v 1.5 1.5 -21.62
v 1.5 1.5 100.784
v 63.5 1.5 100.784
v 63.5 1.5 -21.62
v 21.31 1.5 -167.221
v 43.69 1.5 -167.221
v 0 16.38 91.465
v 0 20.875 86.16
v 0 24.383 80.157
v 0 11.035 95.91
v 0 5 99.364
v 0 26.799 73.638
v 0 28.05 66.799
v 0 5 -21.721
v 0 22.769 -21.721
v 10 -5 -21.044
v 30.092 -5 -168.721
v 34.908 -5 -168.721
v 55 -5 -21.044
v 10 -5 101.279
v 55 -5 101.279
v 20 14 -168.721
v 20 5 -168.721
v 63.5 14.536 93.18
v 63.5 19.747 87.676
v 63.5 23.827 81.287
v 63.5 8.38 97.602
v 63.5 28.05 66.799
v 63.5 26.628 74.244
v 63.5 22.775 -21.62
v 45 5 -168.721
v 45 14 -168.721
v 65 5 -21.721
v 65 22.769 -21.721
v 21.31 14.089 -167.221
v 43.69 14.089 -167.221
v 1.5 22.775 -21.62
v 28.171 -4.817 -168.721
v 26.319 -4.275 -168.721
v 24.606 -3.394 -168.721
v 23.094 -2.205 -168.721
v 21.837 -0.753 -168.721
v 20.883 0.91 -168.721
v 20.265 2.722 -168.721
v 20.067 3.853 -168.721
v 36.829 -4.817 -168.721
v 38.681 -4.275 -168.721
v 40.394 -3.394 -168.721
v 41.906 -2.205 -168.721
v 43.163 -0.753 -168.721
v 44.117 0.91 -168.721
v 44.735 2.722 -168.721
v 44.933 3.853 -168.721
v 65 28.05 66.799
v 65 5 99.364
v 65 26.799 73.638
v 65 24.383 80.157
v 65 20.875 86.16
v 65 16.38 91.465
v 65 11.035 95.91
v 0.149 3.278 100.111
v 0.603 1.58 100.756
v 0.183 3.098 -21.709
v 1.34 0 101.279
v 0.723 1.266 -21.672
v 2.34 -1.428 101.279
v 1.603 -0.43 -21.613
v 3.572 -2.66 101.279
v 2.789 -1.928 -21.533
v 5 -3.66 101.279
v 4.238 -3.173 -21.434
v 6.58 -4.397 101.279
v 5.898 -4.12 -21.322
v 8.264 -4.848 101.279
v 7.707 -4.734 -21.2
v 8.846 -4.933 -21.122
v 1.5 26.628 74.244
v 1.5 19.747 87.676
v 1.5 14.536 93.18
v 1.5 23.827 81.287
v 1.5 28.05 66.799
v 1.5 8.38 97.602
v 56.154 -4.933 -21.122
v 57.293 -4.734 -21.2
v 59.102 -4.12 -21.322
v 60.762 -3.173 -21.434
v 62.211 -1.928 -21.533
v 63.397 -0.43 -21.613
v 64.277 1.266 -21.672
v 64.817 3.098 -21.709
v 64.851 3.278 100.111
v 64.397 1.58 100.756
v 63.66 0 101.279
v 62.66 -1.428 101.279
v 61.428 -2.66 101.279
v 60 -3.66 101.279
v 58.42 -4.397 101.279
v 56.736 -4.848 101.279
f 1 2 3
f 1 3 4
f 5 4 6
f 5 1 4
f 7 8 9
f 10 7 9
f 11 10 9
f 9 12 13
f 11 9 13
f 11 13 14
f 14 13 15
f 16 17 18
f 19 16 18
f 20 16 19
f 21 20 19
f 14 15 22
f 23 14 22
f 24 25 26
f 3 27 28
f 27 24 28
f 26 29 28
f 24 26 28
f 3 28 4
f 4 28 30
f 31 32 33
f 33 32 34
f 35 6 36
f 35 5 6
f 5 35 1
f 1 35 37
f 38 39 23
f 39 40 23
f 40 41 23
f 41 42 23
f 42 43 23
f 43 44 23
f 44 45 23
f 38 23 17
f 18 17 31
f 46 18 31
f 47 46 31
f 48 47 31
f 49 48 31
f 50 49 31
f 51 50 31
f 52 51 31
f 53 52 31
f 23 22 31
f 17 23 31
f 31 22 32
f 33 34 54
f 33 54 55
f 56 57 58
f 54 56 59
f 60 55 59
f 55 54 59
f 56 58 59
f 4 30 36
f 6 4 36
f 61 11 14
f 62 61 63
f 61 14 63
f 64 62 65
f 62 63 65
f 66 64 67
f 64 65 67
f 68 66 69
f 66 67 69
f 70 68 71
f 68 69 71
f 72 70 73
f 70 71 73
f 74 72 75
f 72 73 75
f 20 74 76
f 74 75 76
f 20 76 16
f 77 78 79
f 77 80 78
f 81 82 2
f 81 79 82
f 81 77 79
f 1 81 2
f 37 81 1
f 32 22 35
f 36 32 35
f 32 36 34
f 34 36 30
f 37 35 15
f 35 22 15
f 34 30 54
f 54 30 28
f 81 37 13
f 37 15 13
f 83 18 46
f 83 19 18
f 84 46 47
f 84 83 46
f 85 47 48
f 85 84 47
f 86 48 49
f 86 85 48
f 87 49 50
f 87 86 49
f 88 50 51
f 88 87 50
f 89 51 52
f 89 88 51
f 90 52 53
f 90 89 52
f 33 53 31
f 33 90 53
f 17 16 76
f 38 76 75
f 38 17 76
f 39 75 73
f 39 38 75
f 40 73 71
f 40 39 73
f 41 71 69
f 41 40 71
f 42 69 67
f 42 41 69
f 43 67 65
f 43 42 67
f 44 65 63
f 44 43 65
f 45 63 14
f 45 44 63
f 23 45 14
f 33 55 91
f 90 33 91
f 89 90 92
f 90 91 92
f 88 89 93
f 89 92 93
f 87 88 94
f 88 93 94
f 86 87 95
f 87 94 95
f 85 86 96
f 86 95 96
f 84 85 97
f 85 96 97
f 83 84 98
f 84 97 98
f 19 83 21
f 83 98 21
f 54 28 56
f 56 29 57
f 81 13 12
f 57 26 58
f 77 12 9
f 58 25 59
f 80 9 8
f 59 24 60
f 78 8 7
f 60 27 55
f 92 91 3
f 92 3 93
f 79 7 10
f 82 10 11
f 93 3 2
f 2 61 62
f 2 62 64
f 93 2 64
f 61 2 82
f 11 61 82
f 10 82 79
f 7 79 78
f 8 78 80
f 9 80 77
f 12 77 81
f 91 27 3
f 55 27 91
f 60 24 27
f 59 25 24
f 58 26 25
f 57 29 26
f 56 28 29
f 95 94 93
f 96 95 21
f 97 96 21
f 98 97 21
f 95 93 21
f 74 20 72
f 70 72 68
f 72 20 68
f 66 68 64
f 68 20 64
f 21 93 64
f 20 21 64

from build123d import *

# Parameters (mm, degrees)
BOSS_EXTRUDE1_DEPTH     = 65
CUT_EXTRUDE1_DEPTH      = 183.971935996
CUT_EXTRUDE1_DEPTH_BACK = 183.971935996
CUT_EXTRUDE2_DEPTH      = 183.971935996
CUT_EXTRUDE2_DEPTH_BACK = 183.971935996
SHELL2_T                = -1.5
BOSS_EXTRUDE4_DEPTH     = 5
FILLET12_R              = 10


with BuildPart() as part:
    # Sketch1 → Boss-Extrude1 (new body)
    with BuildSketch(Plane(origin=(0, 0, 0), x_dir=(0, 0, -1), z_dir=(1, 0, 0))):
        with BuildLine():
            Line((-101.278568247, 0), (168.721431753, 0))
            Line((168.721431753, 0), (168.721431753, 14))
            Line((168.721431753, 14), (-66.798599974, 28.050095))
            ThreePointArc((-66.798599974, 28.050095), (-88.293376402, 19.255158243), (-101.278568247, 0))
        make_face()
    extrude(amount=BOSS_EXTRUDE1_DEPTH)

    # Sketch3 → Cut-Extrude1 (cut, two sides: drawn at the far end of the back side and taken through both)
    with BuildSketch(Plane.XZ.offset(-CUT_EXTRUDE1_DEPTH_BACK)):
        Polygon((-75.150987408, 530.638325694), (0, -21.721431753), (20, -168.721431753), (95.150987408, -721.081189199), (-1009.568527485, -871.383164014), (-1179.8705023, 380.336350878), align=None)
    extrude(amount=CUT_EXTRUDE1_DEPTH + CUT_EXTRUDE1_DEPTH_BACK, mode=Mode.SUBTRACT)

    # Sketch5 → Cut-Extrude2 (cut, two sides: drawn at the far end of the back side and taken through both)
    with BuildSketch(Plane.XZ.offset(-CUT_EXTRUDE2_DEPTH_BACK)):
        Polygon((140.150987408, 530.638325694), (65, -21.721431753), (45, -168.721431753), (-30.150987408, -721.081189199), (1074.568527485, -871.383164014), (1244.8705023, 380.336350878), align=None)
    extrude(amount=CUT_EXTRUDE2_DEPTH + CUT_EXTRUDE2_DEPTH_BACK, mode=Mode.SUBTRACT)

    # Shell2
    shell2_openings = [part.faces().sort_by_distance(p)[0] for p in [
        (32.5, 22.000053007, -34.617517295),
        (32.5, 19.255158243, 88.293376402),
    ]]
    offset(amount=SHELL2_T, openings=shell2_openings, kind=Kind.INTERSECTION)

    # Sketch18 → Boss-Extrude4 (add)
    with BuildSketch(Plane.XZ):
        Polygon((65, 101.278568247), (0, 101.278568247), (0, -21.721431753), (20, -168.721431753), (45, -168.721431753), (65, -21.721431753), align=None)
    extrude(amount=BOSS_EXTRUDE4_DEPTH)

    # Fillet12
    fillet12_edges = [part.edges().sort_by_distance(p)[0] for p in [
        (65, -5, 39.778568247),
        (0, -5, 39.778568247),
        (10, -5, -95.221431753),
        (55, -5, -95.221431753),
    ]]
    fillet(fillet12_edges, radius=FILLET12_R)


solid = part.part
